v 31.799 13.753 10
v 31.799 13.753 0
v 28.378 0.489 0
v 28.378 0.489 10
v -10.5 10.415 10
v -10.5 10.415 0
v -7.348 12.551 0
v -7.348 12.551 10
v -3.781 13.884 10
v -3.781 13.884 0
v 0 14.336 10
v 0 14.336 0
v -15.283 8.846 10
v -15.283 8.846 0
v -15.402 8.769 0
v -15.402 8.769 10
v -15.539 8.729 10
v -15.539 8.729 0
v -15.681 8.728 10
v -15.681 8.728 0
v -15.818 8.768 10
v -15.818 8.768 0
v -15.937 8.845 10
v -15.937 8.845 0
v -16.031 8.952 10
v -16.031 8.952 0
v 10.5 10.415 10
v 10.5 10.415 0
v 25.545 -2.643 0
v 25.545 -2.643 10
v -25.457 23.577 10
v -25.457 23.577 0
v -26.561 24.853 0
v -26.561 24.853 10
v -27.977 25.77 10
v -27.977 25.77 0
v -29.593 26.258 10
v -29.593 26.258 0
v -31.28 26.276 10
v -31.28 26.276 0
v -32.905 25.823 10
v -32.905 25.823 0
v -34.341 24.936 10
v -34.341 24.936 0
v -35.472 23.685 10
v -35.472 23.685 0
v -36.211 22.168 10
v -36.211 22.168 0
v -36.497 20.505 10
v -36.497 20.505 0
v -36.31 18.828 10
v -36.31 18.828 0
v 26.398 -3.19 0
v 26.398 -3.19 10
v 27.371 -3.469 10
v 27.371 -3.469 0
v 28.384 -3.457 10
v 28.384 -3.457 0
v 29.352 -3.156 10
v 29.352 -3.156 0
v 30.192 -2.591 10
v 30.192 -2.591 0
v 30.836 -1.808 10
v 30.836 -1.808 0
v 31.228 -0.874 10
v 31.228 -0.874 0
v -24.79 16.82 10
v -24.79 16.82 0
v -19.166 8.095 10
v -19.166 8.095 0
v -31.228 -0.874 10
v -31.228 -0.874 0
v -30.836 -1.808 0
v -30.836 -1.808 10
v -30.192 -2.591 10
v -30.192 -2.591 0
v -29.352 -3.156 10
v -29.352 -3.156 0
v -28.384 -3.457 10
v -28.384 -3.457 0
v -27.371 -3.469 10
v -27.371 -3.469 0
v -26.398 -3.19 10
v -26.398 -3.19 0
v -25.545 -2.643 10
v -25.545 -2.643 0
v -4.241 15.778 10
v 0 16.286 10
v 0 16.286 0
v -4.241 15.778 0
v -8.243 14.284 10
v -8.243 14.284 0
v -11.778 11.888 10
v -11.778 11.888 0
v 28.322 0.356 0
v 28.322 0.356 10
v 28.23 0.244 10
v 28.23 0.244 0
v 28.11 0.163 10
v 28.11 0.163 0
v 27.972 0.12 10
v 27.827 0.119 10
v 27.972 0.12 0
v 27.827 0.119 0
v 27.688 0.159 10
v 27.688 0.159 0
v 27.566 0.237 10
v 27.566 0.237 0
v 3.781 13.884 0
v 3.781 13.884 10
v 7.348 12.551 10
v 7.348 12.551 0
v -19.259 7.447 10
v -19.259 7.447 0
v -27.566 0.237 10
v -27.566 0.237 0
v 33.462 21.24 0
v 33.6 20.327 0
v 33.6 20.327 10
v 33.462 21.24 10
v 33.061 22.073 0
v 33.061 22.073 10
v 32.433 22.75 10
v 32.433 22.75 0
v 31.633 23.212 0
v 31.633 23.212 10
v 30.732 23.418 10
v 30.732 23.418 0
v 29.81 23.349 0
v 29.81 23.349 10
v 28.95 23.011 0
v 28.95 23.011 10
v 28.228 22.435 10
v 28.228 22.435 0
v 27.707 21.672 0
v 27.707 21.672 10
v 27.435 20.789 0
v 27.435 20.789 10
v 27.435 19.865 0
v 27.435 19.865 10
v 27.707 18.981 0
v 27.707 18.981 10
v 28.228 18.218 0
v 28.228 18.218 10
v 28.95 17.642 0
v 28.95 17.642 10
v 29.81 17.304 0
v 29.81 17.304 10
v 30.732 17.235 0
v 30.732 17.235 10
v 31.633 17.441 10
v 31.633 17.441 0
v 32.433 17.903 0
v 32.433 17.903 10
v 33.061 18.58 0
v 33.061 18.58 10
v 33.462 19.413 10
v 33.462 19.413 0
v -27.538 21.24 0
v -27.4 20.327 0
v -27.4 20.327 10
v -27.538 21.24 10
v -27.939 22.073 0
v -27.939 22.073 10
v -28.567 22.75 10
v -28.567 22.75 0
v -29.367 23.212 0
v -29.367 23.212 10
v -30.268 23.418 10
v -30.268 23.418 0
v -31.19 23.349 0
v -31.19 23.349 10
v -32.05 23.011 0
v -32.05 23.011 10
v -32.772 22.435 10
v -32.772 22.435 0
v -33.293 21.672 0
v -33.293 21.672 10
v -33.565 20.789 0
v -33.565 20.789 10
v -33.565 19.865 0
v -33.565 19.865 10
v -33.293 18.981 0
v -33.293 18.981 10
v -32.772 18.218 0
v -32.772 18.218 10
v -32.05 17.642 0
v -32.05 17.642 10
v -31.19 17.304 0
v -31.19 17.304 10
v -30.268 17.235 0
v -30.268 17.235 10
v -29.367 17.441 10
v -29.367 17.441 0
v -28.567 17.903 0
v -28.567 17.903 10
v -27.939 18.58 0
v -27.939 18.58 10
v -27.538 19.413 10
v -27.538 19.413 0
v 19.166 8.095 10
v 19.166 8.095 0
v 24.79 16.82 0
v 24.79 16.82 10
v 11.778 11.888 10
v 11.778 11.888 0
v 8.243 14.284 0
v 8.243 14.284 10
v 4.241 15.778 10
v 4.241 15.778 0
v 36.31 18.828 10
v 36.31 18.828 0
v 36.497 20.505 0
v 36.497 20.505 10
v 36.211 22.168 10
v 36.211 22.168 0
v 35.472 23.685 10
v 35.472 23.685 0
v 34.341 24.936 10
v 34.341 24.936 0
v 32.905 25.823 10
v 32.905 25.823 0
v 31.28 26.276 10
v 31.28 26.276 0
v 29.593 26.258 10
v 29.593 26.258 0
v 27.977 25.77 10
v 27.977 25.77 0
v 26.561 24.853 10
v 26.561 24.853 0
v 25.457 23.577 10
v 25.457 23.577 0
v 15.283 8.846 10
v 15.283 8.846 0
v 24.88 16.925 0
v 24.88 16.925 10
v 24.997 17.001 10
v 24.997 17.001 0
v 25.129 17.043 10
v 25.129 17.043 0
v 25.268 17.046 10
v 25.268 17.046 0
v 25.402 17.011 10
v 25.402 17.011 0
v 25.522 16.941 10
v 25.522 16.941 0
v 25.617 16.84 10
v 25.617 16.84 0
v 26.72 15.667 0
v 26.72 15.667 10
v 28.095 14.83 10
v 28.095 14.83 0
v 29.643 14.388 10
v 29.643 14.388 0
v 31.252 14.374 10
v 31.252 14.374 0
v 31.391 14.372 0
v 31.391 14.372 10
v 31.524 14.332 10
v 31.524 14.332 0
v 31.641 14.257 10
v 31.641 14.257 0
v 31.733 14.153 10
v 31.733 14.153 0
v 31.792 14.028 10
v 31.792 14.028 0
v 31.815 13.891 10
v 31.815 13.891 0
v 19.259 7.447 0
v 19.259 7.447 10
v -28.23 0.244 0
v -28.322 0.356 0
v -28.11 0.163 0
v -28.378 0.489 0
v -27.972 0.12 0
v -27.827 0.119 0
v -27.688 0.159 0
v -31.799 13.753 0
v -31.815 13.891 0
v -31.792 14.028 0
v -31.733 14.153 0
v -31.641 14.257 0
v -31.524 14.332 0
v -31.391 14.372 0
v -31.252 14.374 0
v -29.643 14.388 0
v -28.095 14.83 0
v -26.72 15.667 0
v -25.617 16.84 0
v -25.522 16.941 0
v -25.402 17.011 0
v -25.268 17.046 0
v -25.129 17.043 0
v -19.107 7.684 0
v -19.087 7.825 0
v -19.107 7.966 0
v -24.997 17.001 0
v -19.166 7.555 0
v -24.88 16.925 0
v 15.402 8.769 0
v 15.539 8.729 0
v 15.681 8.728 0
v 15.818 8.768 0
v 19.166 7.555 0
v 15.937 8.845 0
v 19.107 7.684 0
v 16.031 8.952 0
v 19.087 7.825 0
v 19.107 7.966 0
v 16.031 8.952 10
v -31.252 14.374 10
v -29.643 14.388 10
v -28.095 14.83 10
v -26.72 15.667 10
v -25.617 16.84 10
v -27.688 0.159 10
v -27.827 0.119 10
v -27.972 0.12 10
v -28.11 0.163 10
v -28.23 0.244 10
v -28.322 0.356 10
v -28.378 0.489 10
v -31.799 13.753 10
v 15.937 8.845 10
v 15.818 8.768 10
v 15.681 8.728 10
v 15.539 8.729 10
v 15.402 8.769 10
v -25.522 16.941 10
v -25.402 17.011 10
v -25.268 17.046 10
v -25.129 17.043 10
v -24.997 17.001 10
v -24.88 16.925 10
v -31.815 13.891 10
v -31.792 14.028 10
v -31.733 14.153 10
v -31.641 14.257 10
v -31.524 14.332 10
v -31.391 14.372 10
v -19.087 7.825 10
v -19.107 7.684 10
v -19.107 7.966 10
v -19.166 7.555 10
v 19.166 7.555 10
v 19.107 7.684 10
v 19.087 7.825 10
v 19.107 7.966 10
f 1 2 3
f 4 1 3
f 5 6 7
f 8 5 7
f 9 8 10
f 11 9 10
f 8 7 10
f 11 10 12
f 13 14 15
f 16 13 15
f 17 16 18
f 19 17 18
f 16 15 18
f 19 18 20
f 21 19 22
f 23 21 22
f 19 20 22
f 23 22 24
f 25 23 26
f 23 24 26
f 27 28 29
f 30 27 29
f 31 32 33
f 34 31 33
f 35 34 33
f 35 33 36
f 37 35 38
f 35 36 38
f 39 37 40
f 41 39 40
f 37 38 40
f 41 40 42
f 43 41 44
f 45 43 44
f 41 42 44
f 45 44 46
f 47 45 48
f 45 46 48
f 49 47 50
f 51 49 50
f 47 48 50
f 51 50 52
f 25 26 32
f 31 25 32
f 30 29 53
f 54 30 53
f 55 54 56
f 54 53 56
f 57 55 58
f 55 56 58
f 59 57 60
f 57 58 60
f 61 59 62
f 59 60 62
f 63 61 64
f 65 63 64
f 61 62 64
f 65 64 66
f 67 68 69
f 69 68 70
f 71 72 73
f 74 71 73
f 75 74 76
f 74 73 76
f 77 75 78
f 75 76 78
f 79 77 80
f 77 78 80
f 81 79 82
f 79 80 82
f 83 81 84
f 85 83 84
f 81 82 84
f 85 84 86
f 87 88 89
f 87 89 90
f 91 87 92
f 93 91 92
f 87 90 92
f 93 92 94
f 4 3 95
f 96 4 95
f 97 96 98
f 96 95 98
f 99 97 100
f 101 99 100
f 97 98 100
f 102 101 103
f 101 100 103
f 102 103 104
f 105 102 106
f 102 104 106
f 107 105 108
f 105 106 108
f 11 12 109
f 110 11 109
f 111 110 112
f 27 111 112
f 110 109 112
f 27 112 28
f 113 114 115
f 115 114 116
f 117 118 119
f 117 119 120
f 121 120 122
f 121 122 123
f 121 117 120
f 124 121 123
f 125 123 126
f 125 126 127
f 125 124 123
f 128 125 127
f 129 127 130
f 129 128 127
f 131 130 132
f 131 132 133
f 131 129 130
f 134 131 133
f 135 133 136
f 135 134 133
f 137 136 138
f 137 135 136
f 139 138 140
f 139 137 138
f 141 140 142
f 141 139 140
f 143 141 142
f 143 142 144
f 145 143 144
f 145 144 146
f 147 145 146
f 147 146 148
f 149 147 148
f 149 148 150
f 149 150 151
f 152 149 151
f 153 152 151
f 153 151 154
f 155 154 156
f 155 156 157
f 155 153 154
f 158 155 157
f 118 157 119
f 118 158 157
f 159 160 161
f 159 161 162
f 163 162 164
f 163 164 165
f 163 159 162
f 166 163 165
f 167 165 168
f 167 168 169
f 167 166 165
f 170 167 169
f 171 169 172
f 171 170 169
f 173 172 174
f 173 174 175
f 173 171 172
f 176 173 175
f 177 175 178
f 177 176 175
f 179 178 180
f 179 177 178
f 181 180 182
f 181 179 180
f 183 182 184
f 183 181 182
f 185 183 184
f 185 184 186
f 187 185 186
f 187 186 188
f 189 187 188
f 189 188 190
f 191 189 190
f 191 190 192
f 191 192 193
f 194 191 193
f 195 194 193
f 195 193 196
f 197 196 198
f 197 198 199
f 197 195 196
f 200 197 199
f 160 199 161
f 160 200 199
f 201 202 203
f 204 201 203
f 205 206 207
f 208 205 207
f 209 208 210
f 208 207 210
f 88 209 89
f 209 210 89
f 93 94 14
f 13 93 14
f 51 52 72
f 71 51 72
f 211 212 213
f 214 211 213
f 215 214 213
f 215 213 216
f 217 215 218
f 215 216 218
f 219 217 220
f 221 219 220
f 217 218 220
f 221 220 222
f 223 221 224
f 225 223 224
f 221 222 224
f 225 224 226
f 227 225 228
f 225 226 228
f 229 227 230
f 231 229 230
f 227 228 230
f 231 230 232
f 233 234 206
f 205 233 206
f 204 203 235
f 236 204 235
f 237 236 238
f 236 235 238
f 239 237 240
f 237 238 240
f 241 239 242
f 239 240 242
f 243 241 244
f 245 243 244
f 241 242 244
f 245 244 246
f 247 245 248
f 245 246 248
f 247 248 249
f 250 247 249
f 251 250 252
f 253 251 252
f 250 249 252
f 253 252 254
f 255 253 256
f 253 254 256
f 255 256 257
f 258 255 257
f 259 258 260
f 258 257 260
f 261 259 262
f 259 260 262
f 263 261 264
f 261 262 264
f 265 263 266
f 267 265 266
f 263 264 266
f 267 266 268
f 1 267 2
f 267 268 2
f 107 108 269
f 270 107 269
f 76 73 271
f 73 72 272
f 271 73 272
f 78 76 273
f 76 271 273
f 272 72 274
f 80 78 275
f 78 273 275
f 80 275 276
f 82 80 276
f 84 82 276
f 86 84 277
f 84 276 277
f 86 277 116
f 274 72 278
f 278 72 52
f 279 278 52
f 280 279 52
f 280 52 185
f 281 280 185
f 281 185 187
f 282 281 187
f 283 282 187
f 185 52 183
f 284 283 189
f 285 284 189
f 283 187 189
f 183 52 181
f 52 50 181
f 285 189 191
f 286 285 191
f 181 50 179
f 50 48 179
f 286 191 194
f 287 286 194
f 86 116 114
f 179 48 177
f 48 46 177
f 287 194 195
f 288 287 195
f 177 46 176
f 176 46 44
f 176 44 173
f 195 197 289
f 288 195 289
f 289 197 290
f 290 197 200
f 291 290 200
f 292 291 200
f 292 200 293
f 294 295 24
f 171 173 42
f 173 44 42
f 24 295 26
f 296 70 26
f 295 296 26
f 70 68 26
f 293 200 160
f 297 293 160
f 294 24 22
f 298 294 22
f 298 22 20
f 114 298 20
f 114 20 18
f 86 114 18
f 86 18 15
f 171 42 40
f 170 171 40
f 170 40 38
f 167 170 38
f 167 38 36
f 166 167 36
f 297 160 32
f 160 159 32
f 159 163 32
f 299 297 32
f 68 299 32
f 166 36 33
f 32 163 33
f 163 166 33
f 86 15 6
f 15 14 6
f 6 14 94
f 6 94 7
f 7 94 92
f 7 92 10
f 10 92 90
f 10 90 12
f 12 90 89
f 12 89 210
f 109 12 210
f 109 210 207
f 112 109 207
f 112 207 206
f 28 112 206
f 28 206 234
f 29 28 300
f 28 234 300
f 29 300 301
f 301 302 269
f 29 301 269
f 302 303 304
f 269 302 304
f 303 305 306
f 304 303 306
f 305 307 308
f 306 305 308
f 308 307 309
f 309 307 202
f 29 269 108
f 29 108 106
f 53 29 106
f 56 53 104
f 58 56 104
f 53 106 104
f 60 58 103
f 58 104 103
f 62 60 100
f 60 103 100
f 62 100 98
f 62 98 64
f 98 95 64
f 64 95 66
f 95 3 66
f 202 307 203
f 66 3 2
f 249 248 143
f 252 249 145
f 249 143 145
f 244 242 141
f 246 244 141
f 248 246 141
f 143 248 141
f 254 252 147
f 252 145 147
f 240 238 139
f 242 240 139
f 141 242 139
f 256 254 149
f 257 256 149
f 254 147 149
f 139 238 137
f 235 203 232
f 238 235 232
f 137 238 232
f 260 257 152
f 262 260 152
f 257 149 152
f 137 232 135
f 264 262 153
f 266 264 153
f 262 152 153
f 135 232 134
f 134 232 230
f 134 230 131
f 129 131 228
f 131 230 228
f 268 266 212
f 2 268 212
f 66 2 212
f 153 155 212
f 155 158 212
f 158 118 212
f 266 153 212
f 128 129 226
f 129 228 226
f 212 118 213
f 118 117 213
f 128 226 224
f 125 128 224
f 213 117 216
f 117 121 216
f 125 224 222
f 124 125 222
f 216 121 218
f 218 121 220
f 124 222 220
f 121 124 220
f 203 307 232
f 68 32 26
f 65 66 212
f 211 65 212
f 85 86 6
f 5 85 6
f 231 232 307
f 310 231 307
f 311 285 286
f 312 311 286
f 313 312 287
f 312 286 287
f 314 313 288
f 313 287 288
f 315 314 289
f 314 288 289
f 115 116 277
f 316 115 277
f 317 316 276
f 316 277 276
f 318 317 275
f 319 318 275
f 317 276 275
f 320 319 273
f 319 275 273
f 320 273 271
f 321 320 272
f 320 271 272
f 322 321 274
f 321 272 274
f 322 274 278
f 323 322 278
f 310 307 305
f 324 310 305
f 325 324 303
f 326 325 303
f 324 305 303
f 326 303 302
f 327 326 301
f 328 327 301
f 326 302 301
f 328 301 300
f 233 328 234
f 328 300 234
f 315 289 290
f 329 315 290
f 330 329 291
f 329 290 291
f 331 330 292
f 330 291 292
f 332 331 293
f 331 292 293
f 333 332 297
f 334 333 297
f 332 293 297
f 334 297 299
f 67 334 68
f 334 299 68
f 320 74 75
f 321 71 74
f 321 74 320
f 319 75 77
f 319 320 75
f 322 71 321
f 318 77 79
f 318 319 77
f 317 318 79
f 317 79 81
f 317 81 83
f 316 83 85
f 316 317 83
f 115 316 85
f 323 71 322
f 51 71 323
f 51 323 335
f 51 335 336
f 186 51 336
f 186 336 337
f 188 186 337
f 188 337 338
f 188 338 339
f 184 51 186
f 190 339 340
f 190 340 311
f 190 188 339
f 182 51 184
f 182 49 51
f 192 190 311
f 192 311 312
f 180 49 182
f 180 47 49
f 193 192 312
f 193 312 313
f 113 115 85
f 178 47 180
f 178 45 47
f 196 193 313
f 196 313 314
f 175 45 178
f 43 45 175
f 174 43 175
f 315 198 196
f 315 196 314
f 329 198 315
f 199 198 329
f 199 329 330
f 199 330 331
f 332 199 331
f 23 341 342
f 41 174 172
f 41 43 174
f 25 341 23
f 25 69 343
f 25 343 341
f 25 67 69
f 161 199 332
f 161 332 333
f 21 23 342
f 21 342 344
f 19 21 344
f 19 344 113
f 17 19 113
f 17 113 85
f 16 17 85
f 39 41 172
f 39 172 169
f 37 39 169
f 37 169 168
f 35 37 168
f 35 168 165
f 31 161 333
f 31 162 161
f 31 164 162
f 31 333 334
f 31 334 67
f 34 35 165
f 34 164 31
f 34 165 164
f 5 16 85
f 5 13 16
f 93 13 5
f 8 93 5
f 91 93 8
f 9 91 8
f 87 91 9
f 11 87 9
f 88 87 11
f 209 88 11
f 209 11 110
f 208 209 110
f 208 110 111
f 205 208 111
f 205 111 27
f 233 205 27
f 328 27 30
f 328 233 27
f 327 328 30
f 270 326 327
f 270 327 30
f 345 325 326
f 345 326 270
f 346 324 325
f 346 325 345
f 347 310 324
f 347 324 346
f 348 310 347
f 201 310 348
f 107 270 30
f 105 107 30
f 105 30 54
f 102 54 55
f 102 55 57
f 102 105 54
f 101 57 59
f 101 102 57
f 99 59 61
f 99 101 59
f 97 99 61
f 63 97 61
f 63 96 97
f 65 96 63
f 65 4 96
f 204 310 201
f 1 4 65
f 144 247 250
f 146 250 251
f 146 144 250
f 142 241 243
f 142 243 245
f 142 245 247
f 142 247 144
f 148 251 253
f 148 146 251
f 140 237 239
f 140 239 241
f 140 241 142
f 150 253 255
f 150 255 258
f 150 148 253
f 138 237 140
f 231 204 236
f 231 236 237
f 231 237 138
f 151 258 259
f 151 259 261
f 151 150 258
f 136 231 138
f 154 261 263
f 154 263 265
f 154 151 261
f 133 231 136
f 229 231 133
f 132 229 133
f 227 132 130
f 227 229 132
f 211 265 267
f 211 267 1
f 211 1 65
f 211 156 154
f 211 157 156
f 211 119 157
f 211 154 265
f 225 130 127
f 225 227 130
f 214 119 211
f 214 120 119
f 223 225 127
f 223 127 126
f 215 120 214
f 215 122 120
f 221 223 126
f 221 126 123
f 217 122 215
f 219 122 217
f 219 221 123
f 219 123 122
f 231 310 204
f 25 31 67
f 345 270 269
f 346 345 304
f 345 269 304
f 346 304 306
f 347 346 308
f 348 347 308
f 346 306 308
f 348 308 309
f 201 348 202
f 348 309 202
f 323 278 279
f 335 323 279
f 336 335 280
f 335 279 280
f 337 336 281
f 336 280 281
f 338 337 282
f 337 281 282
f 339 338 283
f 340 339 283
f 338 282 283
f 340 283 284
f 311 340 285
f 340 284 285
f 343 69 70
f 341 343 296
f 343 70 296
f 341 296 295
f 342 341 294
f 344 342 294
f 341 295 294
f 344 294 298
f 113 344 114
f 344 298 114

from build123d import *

# Parameters (mm, degrees)
F0_R     = 3.1
F1_DEPTH = 10


with BuildPart() as f1:
    # F0 (on Top) → F1 (new body)
    with BuildSketch(Plane.XY):
        with BuildLine():
            Line((10.5, 10.414885), (25.544604, -2.64322))
            ThreePointArc((25.544604, -2.64322), (28.879034, -3.341846), (31.227885, -0.874176))
            Line((31.227885, -0.874176), (36.30984, 18.827949))
            ThreePointArc((36.30984, 18.827949), (32.905301, 25.823311), (25.456785, 23.577072))
            Line((25.456785, 23.577072), (16.030713, 8.952498))
            ThreePointArc((16.030713, 8.952498), (15.681068, 8.728389), (15.282701, 8.845773))
            Line((15.282701, 8.845773), (11.778201, 11.887536))
            ThreePointArc((11.778201, 11.887536), (6.28637, 15.150615), (0, 16.286148))
            ThreePointArc((0, 16.286148), (-6.28637, 15.150615), (-11.778201, 11.887536))
            Line((-11.778201, 11.887536), (-15.282701, 8.845773))
            ThreePointArc((-15.282701, 8.845773), (-15.681068, 8.728389), (-16.030713, 8.952498))
            Line((-16.030713, 8.952498), (-25.456785, 23.577072))
            ThreePointArc((-25.456785, 23.577072), (-32.905301, 25.823311), (-36.30984, 18.827949))
            Line((-36.30984, 18.827949), (-31.227885, -0.874176))
            ThreePointArc((-31.227885, -0.874176), (-28.879034, -3.341846), (-25.544604, -2.64322))
            Line((-25.544604, -2.64322), (-10.5, 10.414885))
            ThreePointArc((-10.5, 10.414885), (-5.604157, 13.323846), (0, 14.336148))
            ThreePointArc((0, 14.336148), (5.604157, 13.323846), (10.5, 10.414885))
        make_face()
        with BuildLine():
            Line((-19.258958, 7.446964), (-27.566221, 0.236597))
            ThreePointArc((-27.566221, 0.236597), (-28.042568, 0.136794), (-28.378118, 0.489318))
            Line((-28.378118, 0.489318), (-31.799338, 13.752974))
            ThreePointArc((-31.799338, 13.752974), (-31.69041, 14.208319), (-31.252478, 14.373909))
            ThreePointArc((-31.252478, 14.373909), (-28.094699, 14.829762), (-25.617044, 16.839884))
            ThreePointArc((-25.617044, 16.839884), (-25.198241, 17.049189), (-24.789863, 16.820208))
            Line((-24.789863, 16.820208), (-19.166434, 8.095445))
            ThreePointArc((-19.166434, 8.095445), (-19.091715, 7.753943), (-19.258958, 7.446964))
        make_face(mode=Mode.SUBTRACT)
        with BuildLine():
            ThreePointArc((24.789863, 16.820208), (25.198241, 17.049189), (25.617044, 16.839884))
            ThreePointArc((25.617044, 16.839884), (28.094699, 14.829762), (31.252478, 14.373909))
            ThreePointArc((31.252478, 14.373909), (31.69041, 14.208319), (31.799338, 13.752974))
            Line((31.799338, 13.752974), (28.378118, 0.489318))
            ThreePointArc((28.378118, 0.489318), (28.042568, 0.136794), (27.566221, 0.236597))
            Line((27.566221, 0.236597), (19.258958, 7.446964))
            ThreePointArc((19.258958, 7.446964), (19.091715, 7.753943), (19.166434, 8.095445))
            Line((19.166434, 8.095445), (24.789863, 16.820208))
        make_face(mode=Mode.SUBTRACT)
        with Locations((-30.5, 20.326536)):
            Circle(F0_R, mode=Mode.SUBTRACT)
        with Locations((30.5, 20.326536)):
            Circle(F0_R, mode=Mode.SUBTRACT)
    extrude(amount=F1_DEPTH)


solid = f1.part
